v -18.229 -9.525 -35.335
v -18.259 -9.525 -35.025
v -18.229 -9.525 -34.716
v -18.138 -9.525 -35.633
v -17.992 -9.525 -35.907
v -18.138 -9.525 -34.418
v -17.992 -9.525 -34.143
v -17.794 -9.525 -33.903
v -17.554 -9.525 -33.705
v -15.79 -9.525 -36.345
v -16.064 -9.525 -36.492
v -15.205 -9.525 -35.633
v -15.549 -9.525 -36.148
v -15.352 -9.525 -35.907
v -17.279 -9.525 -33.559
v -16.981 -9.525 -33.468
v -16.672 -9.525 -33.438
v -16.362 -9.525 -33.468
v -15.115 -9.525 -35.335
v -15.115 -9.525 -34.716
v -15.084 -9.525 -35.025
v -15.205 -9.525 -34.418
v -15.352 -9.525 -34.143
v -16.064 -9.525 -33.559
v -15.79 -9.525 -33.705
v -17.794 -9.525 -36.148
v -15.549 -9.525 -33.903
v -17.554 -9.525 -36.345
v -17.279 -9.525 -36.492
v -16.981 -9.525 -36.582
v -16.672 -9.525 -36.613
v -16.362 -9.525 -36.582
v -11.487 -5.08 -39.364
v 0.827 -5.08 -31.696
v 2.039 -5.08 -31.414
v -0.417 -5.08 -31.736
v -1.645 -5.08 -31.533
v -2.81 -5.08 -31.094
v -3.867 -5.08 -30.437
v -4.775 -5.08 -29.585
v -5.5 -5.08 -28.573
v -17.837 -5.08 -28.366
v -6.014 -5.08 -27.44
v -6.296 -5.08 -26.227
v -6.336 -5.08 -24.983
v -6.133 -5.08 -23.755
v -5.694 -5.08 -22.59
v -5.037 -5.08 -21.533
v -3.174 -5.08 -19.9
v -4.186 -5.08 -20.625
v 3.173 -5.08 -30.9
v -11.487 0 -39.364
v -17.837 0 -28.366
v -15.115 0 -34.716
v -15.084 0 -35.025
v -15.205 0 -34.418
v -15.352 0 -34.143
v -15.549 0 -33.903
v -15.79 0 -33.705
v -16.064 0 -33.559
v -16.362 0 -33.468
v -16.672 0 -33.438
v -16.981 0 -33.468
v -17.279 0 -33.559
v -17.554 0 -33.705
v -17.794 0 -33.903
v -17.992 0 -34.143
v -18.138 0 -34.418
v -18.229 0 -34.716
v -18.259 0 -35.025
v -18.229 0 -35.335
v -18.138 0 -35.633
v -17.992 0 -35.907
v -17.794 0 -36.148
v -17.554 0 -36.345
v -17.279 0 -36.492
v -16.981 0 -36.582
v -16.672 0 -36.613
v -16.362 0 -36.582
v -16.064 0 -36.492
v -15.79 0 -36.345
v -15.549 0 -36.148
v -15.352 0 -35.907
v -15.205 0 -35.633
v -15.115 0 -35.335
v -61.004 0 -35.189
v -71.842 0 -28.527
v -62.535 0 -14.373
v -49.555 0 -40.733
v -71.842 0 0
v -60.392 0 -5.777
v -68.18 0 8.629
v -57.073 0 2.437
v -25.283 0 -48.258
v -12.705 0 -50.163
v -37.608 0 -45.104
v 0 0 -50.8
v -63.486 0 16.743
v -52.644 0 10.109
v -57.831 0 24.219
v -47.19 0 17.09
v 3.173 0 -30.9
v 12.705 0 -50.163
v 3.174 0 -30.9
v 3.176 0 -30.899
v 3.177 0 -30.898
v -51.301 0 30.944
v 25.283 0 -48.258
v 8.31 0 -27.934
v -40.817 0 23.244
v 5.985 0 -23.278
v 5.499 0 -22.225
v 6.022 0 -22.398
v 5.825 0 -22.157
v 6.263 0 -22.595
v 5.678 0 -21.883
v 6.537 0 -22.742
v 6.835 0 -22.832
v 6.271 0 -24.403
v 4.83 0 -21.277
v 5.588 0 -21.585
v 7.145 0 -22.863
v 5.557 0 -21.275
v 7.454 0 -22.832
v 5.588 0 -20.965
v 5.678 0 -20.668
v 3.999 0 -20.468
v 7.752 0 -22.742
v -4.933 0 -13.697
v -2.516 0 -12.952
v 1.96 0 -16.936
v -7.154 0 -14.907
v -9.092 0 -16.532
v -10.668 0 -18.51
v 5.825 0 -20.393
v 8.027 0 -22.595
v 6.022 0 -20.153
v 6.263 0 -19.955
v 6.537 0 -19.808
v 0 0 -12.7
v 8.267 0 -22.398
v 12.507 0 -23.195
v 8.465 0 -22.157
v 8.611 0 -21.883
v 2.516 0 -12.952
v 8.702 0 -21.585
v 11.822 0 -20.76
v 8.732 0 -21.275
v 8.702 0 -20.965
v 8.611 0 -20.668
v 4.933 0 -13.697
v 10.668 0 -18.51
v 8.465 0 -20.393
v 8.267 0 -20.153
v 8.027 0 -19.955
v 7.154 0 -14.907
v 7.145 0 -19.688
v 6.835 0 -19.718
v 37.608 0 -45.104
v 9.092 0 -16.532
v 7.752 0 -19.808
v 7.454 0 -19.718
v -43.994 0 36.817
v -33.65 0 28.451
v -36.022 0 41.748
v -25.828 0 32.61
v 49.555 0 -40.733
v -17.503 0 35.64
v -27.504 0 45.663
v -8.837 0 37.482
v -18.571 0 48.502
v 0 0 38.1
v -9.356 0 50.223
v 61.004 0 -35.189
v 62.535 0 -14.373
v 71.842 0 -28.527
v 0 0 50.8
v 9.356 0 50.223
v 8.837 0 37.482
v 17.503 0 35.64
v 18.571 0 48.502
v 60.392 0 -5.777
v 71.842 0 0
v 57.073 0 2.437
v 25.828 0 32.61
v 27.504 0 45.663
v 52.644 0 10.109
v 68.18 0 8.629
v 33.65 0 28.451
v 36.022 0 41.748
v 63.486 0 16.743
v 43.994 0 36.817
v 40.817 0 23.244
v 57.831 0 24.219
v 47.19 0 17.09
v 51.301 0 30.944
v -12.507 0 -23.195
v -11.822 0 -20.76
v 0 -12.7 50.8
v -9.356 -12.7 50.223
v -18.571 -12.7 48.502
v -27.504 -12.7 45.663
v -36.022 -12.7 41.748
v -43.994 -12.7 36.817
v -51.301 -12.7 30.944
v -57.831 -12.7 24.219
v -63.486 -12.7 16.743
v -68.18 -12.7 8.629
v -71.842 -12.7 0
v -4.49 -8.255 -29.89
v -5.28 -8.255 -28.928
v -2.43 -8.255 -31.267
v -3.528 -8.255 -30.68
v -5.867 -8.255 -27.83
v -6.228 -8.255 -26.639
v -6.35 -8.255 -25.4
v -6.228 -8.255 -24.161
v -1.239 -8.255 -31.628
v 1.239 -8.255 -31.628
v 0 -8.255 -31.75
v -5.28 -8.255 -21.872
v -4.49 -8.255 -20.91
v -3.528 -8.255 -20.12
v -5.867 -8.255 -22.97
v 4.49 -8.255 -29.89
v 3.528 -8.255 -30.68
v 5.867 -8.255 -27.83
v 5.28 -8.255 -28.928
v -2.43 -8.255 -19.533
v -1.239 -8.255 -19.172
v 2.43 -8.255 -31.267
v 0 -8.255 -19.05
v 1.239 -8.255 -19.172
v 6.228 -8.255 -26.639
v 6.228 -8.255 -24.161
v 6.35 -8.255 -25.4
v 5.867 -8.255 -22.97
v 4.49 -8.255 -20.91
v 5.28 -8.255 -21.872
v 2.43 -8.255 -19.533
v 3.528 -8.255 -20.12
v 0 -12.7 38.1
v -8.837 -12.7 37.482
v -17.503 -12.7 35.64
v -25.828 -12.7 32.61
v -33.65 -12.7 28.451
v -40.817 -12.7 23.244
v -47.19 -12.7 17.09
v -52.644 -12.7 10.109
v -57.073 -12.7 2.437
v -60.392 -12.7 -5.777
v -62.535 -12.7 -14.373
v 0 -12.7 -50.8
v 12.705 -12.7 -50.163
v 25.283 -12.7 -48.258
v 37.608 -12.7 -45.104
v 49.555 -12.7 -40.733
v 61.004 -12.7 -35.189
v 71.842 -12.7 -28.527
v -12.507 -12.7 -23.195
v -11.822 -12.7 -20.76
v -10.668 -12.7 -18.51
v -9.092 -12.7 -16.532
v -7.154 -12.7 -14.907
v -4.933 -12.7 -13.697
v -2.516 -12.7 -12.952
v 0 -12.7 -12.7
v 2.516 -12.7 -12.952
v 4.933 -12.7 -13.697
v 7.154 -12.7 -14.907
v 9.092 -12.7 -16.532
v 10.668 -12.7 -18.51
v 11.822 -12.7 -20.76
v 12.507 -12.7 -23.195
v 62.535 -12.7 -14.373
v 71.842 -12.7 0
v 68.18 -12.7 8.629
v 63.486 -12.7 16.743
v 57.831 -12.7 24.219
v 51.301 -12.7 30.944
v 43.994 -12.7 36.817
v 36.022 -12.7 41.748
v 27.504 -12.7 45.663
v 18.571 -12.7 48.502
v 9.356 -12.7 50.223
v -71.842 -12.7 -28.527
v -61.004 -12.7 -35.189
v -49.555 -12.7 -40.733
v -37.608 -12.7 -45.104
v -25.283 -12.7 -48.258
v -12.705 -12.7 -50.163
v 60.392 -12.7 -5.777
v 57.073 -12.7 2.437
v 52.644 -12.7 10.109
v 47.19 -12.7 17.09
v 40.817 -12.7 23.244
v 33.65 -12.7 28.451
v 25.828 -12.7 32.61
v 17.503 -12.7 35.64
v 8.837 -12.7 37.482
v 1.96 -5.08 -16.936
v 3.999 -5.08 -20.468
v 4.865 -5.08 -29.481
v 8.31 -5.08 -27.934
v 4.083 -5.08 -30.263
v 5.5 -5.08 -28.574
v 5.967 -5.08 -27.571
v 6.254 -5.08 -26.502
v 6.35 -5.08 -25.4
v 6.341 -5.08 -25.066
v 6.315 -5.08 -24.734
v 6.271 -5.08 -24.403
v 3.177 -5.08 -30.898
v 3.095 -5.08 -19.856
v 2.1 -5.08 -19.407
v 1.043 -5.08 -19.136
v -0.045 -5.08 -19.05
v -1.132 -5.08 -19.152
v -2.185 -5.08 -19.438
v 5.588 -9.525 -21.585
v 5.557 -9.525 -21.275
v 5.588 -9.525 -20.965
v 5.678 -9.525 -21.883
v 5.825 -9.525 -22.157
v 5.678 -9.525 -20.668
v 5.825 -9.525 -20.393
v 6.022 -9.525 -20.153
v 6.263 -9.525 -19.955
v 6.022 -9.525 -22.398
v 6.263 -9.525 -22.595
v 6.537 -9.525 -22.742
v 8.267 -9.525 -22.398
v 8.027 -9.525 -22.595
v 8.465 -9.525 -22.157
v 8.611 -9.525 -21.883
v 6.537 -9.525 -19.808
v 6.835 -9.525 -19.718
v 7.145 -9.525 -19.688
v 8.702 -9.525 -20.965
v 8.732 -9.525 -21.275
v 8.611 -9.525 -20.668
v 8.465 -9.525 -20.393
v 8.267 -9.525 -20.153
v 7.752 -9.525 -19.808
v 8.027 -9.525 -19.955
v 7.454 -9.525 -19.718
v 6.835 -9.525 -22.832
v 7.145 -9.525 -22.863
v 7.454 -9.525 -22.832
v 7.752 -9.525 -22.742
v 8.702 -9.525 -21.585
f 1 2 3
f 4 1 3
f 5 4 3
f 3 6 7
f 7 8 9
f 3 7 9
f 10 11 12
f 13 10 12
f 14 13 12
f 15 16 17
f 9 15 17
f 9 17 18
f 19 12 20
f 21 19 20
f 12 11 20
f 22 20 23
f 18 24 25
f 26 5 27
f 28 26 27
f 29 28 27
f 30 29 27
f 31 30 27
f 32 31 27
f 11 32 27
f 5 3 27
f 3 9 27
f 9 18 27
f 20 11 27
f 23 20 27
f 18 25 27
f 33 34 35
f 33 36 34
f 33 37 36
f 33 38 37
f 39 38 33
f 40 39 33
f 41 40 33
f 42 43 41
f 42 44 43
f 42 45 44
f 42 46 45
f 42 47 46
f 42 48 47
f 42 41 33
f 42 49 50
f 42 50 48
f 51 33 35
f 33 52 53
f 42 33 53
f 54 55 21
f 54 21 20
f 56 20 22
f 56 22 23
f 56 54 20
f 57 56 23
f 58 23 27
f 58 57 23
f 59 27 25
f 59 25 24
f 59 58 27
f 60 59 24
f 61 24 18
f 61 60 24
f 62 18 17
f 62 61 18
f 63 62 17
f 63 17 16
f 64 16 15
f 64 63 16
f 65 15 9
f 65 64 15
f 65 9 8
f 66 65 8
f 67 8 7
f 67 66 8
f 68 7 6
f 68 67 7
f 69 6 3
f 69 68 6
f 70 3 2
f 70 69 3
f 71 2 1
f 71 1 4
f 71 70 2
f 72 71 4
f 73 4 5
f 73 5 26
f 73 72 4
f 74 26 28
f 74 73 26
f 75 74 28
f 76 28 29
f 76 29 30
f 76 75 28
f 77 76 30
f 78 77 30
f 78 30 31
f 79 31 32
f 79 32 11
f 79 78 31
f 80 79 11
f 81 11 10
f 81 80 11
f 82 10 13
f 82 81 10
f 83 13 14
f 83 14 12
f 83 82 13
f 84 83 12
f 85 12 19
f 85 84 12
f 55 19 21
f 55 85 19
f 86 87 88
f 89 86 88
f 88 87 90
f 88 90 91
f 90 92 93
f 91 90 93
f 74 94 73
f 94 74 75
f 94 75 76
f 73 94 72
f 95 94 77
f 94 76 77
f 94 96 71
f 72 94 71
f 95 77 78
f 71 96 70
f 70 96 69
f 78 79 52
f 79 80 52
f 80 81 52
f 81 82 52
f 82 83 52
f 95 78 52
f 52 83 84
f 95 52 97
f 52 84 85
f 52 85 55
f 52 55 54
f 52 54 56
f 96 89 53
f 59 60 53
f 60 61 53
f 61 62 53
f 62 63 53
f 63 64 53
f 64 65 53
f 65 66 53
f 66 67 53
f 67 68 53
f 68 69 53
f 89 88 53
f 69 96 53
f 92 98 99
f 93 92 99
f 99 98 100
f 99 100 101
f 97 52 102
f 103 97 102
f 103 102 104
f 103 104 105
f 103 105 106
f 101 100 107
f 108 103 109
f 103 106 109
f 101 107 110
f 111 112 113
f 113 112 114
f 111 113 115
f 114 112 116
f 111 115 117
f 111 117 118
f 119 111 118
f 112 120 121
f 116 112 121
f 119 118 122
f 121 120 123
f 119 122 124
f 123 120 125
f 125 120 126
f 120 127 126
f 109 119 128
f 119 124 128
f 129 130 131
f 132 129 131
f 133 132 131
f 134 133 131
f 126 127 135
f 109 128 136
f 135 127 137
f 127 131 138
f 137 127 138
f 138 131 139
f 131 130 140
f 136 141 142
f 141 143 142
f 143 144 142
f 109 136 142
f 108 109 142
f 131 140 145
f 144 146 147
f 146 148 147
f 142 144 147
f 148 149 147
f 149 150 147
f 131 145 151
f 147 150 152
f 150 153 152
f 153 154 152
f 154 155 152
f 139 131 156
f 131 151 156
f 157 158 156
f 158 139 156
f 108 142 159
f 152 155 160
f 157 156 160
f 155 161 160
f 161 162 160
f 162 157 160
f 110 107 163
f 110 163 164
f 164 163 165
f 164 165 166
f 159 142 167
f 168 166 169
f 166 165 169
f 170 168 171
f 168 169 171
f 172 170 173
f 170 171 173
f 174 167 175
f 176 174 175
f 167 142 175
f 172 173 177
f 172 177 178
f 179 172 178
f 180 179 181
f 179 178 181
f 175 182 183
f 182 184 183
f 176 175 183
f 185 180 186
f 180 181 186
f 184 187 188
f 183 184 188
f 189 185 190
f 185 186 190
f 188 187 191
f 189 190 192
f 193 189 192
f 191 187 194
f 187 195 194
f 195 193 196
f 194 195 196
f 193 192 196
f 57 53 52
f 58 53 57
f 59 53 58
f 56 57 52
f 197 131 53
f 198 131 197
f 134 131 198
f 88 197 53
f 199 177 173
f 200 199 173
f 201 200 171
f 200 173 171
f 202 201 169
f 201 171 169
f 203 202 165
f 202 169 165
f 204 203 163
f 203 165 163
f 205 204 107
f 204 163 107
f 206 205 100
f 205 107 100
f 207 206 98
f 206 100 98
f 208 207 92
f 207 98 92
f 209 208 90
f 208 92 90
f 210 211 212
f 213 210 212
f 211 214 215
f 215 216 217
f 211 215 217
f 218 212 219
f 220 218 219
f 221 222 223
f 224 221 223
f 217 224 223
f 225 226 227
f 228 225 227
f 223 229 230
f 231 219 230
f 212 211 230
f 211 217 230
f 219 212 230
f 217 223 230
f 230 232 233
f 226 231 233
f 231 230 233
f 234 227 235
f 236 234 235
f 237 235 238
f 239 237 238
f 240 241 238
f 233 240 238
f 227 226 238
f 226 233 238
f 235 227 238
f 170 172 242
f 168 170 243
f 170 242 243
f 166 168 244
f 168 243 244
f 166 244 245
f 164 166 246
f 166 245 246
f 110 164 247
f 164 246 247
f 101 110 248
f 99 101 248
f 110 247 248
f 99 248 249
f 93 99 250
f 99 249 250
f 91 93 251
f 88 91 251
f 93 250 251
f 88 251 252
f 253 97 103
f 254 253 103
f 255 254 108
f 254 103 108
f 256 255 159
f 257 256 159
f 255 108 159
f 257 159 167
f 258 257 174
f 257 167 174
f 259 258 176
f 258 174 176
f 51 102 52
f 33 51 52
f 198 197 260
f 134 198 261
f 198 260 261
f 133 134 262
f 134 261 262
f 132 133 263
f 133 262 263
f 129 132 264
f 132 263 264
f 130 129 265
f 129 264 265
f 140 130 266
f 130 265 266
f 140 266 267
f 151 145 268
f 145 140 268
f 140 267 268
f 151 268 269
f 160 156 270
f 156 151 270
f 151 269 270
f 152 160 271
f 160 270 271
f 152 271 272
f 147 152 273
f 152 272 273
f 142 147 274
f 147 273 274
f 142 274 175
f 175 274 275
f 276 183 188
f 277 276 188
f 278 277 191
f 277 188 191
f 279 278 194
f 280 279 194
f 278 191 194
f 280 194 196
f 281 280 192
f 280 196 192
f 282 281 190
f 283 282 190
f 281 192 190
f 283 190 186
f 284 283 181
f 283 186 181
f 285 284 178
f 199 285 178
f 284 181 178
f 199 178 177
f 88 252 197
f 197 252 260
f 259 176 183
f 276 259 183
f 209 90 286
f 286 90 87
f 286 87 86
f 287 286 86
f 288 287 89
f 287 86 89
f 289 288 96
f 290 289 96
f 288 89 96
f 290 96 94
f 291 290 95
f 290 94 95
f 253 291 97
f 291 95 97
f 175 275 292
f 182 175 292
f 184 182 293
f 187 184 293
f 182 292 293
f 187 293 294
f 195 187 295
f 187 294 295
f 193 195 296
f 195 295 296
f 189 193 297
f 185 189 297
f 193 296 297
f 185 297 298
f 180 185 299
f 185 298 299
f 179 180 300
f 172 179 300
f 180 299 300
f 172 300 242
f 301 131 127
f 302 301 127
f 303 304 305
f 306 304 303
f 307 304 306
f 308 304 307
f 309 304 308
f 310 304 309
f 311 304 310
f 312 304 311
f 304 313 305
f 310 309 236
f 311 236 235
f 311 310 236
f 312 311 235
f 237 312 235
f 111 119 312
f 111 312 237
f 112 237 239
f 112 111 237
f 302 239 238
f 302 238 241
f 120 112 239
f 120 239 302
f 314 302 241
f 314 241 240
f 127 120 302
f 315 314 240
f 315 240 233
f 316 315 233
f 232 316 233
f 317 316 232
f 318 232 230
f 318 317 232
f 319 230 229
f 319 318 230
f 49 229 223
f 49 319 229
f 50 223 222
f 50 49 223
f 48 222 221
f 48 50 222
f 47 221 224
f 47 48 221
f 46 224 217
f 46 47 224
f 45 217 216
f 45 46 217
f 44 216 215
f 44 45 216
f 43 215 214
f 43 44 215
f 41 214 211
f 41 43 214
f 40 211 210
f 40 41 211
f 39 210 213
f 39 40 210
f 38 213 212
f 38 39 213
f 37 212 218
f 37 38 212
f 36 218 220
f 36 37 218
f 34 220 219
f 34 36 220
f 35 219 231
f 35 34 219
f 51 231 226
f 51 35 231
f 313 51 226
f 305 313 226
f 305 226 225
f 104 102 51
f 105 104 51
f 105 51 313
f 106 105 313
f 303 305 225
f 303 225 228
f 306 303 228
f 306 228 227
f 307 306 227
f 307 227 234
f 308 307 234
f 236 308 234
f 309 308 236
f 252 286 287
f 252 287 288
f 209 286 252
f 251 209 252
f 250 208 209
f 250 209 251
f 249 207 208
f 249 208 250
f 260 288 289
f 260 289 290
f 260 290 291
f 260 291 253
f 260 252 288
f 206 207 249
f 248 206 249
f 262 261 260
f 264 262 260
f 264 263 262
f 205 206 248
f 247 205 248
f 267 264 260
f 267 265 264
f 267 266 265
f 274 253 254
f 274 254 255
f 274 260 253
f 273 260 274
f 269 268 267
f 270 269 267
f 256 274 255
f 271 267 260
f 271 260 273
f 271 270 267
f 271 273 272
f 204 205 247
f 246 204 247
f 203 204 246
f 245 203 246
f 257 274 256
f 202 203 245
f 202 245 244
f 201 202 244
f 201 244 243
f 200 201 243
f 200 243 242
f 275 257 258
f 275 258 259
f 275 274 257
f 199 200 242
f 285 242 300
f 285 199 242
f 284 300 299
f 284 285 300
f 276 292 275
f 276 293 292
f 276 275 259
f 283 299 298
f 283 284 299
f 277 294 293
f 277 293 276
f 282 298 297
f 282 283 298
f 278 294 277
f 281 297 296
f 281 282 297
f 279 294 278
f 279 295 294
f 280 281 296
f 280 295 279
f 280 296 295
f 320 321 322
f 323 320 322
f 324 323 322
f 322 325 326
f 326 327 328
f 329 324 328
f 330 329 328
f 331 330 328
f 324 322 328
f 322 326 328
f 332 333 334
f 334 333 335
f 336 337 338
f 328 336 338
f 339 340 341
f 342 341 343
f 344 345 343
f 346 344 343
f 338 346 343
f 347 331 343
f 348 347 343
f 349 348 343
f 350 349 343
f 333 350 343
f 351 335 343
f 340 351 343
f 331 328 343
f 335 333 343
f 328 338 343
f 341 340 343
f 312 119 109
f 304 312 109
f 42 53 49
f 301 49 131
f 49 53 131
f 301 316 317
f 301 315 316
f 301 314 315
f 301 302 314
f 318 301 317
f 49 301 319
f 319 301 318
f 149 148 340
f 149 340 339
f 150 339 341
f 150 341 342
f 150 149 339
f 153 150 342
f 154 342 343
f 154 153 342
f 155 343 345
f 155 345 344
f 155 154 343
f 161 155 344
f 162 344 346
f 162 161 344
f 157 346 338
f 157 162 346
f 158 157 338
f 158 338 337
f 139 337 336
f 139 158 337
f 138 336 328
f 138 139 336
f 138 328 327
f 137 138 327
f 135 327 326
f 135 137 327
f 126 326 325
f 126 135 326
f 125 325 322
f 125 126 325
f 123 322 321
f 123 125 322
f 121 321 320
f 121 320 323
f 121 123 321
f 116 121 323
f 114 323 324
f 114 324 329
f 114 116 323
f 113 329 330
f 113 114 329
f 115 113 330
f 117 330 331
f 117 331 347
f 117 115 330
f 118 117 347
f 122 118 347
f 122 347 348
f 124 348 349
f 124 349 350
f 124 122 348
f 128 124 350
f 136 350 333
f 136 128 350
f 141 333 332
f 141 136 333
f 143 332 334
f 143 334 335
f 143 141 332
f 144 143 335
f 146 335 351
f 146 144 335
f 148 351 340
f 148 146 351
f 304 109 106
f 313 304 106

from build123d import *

# Parameters (mm, degrees)
F4_DEPTH = 12.7
F5_DEPTH = 12.7
F2_R     = 6.35
F6_DEPTH = 8.255
F3_R     = 1.5875
F7_DEPTH = 9.525
F9_DEPTH = 5.08


with BuildPart() as f4:
    # F0 (on Front) → F4 (new body)
    with BuildSketch(Plane.XZ):
        with BuildLine():
            ThreePointArc((71.842049, 0), (43.994091, 36.817039), (0, 50.8))
            ThreePointArc((0, 50.8), (-43.994091, 36.817039), (-71.842049, 0))
            Line((-71.842049, 0), (-71.842049, -28.526883))
            ThreePointArc((-71.842049, -28.526883), (-37.607751, -45.103986), (0, -50.8))
            ThreePointArc((0, -50.8), (37.607751, -45.103986), (71.842049, -28.526883))
            Line((71.842049, -28.526883), (71.842049, 0))
        make_face()
    extrude(amount=F4_DEPTH)

    # F1 (on Front) → F5 (cut, symmetric)
    with BuildSketch(Plane.XZ):
        with BuildLine():
            ThreePointArc((62.535292, -14.373341), (40.817013, 23.243822), (0, 38.1))
            ThreePointArc((0, 38.1), (-40.817013, 23.243822), (-62.535292, -14.373341))
            Line((-62.535292, -14.373341), (-12.507058, -23.194668))
            ThreePointArc((-12.507058, -23.194668), (0, -12.7), (12.507058, -23.194668))
            Line((12.507058, -23.194668), (62.535292, -14.373341))
        make_face()
    extrude(amount=F5_DEPTH, both=True, mode=Mode.SUBTRACT)

    # F2 (on Front) → F6 (cut)
    with BuildSketch(Plane.XZ):
        with Locations((0, -25.4)):
            Circle(F2_R)
    extrude(amount=F6_DEPTH, mode=Mode.SUBTRACT)

    # F3 (on Front) → F7 (cut)
    with BuildSketch(Plane.XZ):
        with Locations((7.14464, -21.27504)):
            Circle(F3_R)
        with Locations((-16.671561, -35.02533)):
            Circle(F3_R)
    extrude(amount=F7_DEPTH, mode=Mode.SUBTRACT)

    # F8 (on face) → F9 (cut)
    with BuildSketch(Plane(origin=(0, 0, 0), x_dir=(-1, 0, 0), z_dir=(0, 1, 0))):
        Polygon((-1.96021, -16.935924), (-8.31021, -27.934446), (11.487131, -39.364446), (17.837131, -28.365924), align=None)
    extrude(amount=-F9_DEPTH, mode=Mode.SUBTRACT)


solid = f4.part
